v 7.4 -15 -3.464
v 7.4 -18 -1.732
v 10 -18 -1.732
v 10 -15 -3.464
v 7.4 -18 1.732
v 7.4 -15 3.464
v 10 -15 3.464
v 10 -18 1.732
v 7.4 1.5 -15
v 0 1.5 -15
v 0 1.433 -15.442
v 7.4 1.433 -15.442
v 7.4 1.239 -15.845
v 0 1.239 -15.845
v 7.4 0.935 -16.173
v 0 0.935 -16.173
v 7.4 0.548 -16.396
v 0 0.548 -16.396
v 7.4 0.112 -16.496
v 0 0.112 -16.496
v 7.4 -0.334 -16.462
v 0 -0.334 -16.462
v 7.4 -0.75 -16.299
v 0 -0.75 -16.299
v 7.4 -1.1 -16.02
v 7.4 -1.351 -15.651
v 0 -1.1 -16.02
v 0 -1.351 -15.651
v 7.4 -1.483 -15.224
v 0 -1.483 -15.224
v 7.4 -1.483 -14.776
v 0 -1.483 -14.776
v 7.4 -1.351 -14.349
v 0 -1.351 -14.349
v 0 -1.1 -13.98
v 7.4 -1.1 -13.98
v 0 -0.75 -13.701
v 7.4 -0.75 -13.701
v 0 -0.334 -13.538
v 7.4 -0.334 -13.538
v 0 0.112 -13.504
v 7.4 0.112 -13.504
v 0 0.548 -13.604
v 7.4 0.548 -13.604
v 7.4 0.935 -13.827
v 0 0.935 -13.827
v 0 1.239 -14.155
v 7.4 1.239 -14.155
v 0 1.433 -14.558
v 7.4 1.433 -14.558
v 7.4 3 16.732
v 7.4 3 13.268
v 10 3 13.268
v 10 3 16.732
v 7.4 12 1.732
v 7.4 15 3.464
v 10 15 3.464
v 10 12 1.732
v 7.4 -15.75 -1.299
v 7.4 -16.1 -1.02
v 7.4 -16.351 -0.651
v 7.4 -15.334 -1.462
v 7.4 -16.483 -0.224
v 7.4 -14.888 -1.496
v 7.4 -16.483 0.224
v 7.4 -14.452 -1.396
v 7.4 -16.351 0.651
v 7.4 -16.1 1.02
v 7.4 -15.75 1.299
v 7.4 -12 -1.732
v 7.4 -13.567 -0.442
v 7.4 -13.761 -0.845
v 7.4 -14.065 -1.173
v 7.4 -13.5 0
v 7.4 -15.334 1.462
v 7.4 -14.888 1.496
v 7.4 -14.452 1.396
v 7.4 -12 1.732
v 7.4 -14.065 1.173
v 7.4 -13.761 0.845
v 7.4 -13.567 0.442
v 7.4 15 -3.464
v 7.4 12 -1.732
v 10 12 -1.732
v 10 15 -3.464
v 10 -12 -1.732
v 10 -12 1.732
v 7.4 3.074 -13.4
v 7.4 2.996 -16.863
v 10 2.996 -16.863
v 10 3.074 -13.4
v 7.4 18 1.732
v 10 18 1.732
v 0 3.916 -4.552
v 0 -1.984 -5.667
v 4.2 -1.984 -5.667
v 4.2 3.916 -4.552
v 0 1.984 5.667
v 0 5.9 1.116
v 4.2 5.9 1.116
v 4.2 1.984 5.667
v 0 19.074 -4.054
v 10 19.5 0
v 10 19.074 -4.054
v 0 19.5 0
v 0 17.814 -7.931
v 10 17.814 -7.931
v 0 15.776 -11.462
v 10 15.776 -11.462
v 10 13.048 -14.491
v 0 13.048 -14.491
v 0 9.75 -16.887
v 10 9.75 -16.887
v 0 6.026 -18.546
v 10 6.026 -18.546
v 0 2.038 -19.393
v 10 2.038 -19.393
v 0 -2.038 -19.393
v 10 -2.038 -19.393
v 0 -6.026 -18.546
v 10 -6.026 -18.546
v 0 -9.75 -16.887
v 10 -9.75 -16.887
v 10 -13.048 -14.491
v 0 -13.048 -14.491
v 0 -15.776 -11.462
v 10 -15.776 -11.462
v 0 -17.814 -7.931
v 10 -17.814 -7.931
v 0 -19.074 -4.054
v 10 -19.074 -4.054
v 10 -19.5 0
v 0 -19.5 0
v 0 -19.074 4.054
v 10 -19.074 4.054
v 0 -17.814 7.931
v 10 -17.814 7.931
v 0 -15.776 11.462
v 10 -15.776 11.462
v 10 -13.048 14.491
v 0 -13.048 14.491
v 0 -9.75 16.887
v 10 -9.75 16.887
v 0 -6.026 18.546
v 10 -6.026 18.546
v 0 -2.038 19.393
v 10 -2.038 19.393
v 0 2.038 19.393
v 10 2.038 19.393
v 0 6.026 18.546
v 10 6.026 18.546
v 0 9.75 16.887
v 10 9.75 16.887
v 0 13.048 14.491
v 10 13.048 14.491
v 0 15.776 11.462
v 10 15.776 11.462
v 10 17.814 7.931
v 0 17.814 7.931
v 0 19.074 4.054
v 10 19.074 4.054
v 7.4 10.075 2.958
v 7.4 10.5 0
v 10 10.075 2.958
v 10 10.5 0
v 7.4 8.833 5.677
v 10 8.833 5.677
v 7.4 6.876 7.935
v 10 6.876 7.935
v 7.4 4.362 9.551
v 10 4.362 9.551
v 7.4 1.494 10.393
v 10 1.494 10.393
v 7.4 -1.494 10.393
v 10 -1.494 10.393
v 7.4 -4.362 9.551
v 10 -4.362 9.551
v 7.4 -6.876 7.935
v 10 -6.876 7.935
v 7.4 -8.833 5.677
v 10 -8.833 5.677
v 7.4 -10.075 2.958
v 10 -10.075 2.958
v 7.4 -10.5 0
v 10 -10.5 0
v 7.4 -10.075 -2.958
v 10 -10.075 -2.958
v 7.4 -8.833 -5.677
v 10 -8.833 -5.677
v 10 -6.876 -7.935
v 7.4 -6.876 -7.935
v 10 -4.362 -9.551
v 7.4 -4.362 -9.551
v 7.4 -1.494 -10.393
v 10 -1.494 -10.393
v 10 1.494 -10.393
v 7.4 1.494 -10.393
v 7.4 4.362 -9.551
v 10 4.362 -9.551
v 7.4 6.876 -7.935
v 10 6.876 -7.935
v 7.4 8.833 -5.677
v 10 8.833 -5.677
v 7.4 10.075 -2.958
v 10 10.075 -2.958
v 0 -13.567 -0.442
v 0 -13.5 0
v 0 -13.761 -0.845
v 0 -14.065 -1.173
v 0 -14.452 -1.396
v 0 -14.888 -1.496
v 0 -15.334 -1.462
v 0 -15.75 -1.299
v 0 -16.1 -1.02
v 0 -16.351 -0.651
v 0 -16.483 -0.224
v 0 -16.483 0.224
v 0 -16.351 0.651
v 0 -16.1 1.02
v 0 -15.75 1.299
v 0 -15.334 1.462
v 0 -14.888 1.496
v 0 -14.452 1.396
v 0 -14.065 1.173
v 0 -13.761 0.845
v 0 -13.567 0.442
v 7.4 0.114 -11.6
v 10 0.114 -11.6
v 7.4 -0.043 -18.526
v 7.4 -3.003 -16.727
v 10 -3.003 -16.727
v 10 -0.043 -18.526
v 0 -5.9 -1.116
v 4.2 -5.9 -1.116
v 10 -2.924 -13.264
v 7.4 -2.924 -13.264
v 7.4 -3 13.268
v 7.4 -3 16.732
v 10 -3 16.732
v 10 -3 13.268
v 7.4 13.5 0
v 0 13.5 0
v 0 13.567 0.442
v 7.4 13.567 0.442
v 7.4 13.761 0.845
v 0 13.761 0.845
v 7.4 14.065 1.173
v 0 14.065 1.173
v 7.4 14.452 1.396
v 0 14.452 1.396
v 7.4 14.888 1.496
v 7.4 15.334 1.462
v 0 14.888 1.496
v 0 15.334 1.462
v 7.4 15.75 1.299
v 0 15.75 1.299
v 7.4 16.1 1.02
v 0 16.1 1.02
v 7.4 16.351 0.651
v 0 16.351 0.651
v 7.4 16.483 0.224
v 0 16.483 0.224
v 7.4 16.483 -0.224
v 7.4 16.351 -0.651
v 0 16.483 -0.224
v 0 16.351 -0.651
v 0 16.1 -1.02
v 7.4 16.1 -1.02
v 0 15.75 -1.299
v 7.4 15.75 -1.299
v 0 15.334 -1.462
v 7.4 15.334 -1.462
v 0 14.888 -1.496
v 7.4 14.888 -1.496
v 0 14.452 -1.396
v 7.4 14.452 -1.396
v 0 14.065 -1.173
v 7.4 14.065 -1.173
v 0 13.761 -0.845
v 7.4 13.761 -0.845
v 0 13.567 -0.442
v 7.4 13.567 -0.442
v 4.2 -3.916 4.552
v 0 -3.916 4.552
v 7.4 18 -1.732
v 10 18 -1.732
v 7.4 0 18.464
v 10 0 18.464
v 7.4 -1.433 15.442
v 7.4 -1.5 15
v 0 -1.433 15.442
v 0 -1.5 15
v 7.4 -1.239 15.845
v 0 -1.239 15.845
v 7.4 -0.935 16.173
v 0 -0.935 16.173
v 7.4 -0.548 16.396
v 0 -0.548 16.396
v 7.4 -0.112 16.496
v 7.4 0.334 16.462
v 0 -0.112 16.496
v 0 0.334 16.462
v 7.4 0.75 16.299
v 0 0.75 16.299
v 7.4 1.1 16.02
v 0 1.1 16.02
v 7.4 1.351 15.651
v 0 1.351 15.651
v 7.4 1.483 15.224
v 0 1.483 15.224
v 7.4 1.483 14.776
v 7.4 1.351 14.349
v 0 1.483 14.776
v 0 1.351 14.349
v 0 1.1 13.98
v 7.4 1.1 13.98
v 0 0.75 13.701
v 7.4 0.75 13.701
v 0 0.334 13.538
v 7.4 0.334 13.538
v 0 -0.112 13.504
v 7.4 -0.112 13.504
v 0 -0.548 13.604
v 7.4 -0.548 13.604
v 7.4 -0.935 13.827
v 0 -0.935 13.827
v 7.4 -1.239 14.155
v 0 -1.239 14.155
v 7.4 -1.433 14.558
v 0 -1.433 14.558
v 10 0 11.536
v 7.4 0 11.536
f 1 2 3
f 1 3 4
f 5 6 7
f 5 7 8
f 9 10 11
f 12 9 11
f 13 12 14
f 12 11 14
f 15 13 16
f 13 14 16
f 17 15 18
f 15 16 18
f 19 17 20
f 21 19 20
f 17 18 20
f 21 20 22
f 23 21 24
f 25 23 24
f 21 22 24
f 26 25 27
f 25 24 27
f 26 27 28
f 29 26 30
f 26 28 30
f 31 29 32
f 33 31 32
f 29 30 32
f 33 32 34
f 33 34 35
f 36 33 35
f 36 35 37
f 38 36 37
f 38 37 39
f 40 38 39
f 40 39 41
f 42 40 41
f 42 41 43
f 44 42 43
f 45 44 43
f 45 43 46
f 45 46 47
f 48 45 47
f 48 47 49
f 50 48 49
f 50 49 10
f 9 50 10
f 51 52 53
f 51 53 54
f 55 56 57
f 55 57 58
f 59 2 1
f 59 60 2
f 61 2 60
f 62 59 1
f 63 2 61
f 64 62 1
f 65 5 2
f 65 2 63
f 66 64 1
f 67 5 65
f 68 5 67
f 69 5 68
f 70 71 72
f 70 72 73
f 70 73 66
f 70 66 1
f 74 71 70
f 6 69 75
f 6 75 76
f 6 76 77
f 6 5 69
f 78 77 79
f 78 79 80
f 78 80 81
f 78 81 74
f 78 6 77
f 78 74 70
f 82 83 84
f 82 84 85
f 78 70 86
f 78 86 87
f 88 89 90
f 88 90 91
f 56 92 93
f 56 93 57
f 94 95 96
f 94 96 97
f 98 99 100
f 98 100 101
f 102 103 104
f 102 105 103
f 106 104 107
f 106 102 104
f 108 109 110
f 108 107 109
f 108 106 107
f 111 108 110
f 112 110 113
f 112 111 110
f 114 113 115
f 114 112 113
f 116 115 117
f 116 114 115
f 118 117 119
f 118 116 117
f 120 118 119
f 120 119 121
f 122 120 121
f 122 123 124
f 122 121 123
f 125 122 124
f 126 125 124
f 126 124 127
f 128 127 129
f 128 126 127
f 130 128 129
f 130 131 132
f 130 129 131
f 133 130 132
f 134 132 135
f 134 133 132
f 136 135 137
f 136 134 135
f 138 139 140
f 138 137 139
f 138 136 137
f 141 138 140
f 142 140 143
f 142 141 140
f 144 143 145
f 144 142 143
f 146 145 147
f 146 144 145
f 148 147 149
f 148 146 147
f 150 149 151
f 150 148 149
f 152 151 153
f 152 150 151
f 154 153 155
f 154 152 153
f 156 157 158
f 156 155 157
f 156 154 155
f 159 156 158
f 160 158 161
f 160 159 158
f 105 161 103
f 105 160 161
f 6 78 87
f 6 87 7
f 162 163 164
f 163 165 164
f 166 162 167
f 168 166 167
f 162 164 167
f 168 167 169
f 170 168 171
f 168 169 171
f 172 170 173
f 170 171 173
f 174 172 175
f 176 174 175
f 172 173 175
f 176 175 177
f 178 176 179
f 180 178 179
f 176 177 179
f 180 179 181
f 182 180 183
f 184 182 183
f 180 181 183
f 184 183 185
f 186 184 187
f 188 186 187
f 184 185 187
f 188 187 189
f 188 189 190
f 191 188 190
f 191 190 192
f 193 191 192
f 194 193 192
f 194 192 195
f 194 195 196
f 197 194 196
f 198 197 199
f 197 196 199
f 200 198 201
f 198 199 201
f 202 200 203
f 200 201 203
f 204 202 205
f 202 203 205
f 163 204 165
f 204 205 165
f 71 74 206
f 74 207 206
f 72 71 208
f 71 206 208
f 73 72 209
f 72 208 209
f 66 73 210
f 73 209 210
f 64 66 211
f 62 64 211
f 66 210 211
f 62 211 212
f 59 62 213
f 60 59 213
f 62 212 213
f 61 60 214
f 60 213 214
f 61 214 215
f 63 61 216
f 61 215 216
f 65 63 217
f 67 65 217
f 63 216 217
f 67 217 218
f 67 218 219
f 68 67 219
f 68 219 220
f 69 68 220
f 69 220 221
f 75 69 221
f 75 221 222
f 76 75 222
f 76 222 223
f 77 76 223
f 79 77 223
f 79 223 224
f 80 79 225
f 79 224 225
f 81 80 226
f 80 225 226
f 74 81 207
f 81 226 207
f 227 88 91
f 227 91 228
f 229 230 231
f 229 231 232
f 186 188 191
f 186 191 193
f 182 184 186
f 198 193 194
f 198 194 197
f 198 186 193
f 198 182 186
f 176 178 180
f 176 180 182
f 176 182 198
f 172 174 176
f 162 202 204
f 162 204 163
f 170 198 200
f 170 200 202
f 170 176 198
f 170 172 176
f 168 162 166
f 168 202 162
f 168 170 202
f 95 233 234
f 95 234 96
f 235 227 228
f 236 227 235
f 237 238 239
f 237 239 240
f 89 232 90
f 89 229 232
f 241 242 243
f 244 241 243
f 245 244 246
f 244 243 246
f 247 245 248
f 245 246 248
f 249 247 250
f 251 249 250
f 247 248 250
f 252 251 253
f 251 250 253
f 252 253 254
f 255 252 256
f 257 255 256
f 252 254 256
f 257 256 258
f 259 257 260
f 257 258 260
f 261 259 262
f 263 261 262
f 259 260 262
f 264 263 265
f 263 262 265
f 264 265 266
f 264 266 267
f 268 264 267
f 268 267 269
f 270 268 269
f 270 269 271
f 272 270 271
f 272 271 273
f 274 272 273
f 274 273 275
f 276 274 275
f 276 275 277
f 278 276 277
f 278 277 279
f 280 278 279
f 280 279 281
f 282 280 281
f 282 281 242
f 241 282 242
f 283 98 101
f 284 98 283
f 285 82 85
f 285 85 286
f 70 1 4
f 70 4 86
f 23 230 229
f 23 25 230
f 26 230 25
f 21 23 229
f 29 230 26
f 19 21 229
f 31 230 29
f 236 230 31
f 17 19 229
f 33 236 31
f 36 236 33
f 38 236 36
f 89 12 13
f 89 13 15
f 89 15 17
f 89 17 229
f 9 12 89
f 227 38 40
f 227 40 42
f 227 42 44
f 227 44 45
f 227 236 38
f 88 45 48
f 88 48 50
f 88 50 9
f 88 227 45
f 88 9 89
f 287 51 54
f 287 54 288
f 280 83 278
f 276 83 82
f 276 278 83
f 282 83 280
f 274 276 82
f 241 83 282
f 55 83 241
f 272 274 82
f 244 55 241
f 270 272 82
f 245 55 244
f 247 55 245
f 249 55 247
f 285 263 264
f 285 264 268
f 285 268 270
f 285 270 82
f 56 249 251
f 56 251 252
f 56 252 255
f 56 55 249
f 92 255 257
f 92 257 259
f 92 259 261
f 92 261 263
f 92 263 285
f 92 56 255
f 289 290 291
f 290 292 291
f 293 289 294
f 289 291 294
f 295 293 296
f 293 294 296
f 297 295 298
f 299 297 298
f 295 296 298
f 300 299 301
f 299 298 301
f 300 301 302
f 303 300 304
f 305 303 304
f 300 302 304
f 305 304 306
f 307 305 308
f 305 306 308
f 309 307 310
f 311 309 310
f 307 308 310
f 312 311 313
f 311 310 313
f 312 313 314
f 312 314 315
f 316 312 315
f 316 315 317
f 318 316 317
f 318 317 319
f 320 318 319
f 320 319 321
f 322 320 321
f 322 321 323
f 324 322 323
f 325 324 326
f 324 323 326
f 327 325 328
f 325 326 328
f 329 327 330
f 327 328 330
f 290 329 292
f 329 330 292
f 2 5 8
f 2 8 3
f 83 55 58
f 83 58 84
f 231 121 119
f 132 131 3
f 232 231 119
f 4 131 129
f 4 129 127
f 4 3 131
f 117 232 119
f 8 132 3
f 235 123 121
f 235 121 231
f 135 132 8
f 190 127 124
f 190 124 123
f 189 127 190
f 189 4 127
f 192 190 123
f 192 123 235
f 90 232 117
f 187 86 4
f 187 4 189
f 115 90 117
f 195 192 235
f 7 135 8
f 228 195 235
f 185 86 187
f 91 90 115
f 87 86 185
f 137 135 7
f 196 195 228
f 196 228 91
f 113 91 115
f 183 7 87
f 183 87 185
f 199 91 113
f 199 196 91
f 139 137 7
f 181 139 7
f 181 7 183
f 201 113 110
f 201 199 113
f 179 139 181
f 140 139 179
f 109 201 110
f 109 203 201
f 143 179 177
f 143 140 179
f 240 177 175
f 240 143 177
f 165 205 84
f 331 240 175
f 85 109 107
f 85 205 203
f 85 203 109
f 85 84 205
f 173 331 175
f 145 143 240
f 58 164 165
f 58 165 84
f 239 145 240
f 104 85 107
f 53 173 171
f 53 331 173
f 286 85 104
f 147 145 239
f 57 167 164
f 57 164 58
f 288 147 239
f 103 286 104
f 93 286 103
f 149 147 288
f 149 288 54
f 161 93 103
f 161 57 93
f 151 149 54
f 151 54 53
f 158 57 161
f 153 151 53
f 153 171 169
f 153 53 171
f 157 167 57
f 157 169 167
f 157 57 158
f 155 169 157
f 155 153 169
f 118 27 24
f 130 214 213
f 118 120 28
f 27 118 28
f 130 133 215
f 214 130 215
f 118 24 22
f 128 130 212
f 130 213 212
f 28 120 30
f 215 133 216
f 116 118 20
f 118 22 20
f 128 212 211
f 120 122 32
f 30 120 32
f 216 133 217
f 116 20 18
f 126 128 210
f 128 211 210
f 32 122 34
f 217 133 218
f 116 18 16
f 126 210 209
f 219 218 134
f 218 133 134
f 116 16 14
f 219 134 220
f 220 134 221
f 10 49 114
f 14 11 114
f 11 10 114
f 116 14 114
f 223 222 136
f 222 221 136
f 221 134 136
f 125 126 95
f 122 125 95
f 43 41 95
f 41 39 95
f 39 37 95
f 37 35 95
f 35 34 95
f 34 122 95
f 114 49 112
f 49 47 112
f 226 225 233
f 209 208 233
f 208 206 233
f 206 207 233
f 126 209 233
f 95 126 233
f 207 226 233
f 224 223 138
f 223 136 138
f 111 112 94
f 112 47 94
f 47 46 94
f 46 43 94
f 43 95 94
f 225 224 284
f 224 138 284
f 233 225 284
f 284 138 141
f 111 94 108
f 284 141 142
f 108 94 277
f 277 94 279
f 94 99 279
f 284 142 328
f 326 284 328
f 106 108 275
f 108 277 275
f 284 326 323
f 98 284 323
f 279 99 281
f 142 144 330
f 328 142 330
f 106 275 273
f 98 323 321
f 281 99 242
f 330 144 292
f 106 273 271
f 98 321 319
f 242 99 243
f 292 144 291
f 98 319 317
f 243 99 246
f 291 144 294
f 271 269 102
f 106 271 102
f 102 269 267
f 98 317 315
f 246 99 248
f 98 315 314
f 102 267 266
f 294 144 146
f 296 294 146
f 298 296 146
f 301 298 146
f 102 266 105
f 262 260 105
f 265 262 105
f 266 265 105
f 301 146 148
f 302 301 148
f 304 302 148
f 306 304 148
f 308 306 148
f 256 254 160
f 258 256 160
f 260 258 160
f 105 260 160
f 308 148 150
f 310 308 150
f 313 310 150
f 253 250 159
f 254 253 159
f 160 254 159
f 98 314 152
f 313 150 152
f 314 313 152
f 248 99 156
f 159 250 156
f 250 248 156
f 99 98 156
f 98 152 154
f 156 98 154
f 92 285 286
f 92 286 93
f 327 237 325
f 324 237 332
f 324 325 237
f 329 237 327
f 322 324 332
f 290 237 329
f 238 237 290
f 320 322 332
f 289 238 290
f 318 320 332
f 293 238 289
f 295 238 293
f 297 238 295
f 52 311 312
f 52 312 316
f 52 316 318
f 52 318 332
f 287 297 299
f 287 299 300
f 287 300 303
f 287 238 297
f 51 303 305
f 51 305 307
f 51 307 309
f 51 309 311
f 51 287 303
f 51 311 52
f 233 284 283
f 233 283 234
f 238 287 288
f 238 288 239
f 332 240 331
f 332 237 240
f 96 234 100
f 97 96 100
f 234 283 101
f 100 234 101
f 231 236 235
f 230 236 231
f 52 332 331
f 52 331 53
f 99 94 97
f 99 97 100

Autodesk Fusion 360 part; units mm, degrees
sketch "Sketch1" plane through (0, 0, 0) normal (1, 0, 0) x (0, 1, 0)
  circle A0 centre (0, 0) radius 19.5
  dimension "d1" = 39
extrude "Extrude1" add sketch "Sketch1" along normal blind 10
sketch "Sketch2" plane through (0, 0, 0) normal (1, 0, 0) x (0, 1, 0)
  line L0 (5.8998, 1.1158) -> (1.9836, 5.6673)
  line L1 (1.9836, 5.6673) -> (-3.9163, 4.5515)
  line L2 (-3.9163, 4.5515) -> (-5.8998, -1.1158)
  line L3 (-5.8998, -1.1158) -> (-1.9836, -5.6673)
  line L4 (-1.9836, -5.6673) -> (3.9163, -4.5515)
  line L5 (3.9163, -4.5515) -> (5.8998, 1.1158)
  dimension "d4" = 5.2
extrude "Extrude2" cut sketch "Sketch2" along normal blind 4.2
sketch "Sketch3" plane through (10, 0, 0) normal (1, 0, 0) x (0, 1, 0)
  circle A0 centre (0, 0) radius 19.5
  circle A1 centre (0, 0) radius 10.5
  dimension "d7" = 21
extrude "Extrude3" cut sketch "Sketch3" against normal blind 2.6 contours A1
sketch "Sketch4" plane through (0, 0, 0) normal (1, 0, 0) x (0, 1, 0)
sketch "Sketch5" plane through (0, 0, 0) normal (1, 0, 0) x (0, 1, 0)
  circle A0 centre (0, -15) radius 1.5
  dimension "d10" = 3
sketch "Sketch6" plane through (0, 0, 0) normal (1, 0, 0) x (0, 1, 0)
  circle A0 centre (-14, 0) radius 1.5
  circle A1 centre (0, 14) radius 1.5
  circle A2 centre (14, 0) radius 1.5
  dimension "d13" = 3
  dimension "d14" = 3
  dimension "d15" = 3
sketch "Sketch7" plane through (0, 0, 0) normal (-1, 0, 0) x (0, -1, 0)
  line L0 (1.9836, -5.6673) -> (-3.9163, -4.5515)
  line L1 (-3.9163, -4.5515) -> (-5.8998, 1.1158)
  line L2 (-5.8998, 1.1158) -> (-1.9836, 5.6673)
  line L3 (-1.9836, 5.6673) -> (3.9163, 4.5515)
  line L4 (3.9163, 4.5515) -> (5.8998, -1.1158)
  line L5 (5.8998, -1.1158) -> (1.9836, -5.6673)
  circle A0 centre (0, 0) radius 19.5
  circle A1 centre (0, 15) radius 1.5
  circle A2 centre (-15, 0) radius 1.5
  point P0 (-15, 0)
  dimension "d18" = 3
  dimension "d28" = 3
sketch "Sketch8" plane through (0, 0, 0) normal (1, 0, 0) x (0, 1, 0)
  circle A0 centre (-15, 0) radius 1.5
  dimension "d21" = 3
extrude "Extrude7" cut sketch "Sketch8" along normal blind 12
extrude "Extrude8" cut sketch "Sketch5" along normal blind 15
extrude "Extrude9" cut sketch "Sketch7" against normal blind 15 contours A1
extrude "Extrude10" cut sketch "Sketch7" against normal blind 15 contours A2
sketch "Sketch10" plane through (7.4, 0, 0) normal (1, 0, 0) x (0, 1, 0)
  circle A0 centre (0, 0) radius 10.5
  line L0 (-3.003, -16.7268) -> (-0.0431, -18.5265)
  line L1 (-0.0431, -18.5265) -> (2.9955, -16.8631)
  line L2 (2.9955, -16.8631) -> (3.0742, -13.3999)
  line L3 (3.0742, -13.3999) -> (0.1143, -11.6001)
  line L4 (0.1143, -11.6001) -> (-2.9243, -13.2636)
  line L5 (-2.9243, -13.2636) -> (-3.003, -16.7268)
  point P0 (0.0356, -15.0633)
  dimension "d32" = 3
extrude "Extrude11" cut sketch "Sketch10" along normal blind 2600 contours L0 L1 L2 L3 L4 L5
sketch "Sketch11" plane through (7.4, 0, 0) normal (1, 0, 0) x (0, 1, 0)
  circle A0 centre (0, 0) radius 10.5
  line L0 (-18, -1.7321) -> (-15, -3.4641)
  line L1 (-15, -3.4641) -> (-12, -1.7321)
  line L2 (-12, -1.7321) -> (-12, 1.7321)
  line L3 (-12, 1.7321) -> (-15, 3.4641)
  line L4 (-15, 3.4641) -> (-18, 1.7321)
  line L5 (-18, 1.7321) -> (-18, -1.7321)
  point P0 (-15, 0)
  dimension "d35" = 3
extrude "Extrude12" cut sketch "Sketch11" along normal blind 2.6 contours L0 L1 L2 L3 L4 L5
sketch "Sketch13" plane through (7.4, 0, 0) normal (1, 0, 0) x (0, 1, 0)
  circle A0 centre (0, 0) radius 10.5
  line L0 (3, 16.7321) -> (0, 18.4641)
  line L1 (0, 18.4641) -> (-3, 16.7321)
  line L2 (-3, 16.7321) -> (-3, 13.2679)
  line L3 (-3, 13.2679) -> (0, 11.5359)
  line L4 (0, 11.5359) -> (3, 13.2679)
  line L5 (3, 13.2679) -> (3, 16.7321)
  point P0 (0, 15)
  dimension "d39" = 3
extrude "Extrude13" cut sketch "Sketch13" along normal blind 2.6 contours L0 L1 L2 L3 L4 L5
sketch "Sketch14" plane through (7.4, 0, 0) normal (1, 0, 0) x (0, 1, 0)
  circle A0 centre (0, 0) radius 10.5
  line L0 (12, -1.7321) -> (15, -3.4641)
  line L1 (15, -3.4641) -> (18, -1.7321)
  line L2 (18, -1.7321) -> (18, 1.7321)
  line L3 (18, 1.7321) -> (15, 3.4641)
  line L4 (15, 3.4641) -> (12, 1.7321)
  line L5 (12, 1.7321) -> (12, -1.7321)
  point P0 (15, 0)
extrude "Extrude14" cut sketch "Sketch14" along normal blind 2.6 contours L0 L1 L2 L3 L4 L5
sketch "Sketch15" plane through (7.4, 0, 0) normal (1, 0, 0) x (0, 1, 0)
